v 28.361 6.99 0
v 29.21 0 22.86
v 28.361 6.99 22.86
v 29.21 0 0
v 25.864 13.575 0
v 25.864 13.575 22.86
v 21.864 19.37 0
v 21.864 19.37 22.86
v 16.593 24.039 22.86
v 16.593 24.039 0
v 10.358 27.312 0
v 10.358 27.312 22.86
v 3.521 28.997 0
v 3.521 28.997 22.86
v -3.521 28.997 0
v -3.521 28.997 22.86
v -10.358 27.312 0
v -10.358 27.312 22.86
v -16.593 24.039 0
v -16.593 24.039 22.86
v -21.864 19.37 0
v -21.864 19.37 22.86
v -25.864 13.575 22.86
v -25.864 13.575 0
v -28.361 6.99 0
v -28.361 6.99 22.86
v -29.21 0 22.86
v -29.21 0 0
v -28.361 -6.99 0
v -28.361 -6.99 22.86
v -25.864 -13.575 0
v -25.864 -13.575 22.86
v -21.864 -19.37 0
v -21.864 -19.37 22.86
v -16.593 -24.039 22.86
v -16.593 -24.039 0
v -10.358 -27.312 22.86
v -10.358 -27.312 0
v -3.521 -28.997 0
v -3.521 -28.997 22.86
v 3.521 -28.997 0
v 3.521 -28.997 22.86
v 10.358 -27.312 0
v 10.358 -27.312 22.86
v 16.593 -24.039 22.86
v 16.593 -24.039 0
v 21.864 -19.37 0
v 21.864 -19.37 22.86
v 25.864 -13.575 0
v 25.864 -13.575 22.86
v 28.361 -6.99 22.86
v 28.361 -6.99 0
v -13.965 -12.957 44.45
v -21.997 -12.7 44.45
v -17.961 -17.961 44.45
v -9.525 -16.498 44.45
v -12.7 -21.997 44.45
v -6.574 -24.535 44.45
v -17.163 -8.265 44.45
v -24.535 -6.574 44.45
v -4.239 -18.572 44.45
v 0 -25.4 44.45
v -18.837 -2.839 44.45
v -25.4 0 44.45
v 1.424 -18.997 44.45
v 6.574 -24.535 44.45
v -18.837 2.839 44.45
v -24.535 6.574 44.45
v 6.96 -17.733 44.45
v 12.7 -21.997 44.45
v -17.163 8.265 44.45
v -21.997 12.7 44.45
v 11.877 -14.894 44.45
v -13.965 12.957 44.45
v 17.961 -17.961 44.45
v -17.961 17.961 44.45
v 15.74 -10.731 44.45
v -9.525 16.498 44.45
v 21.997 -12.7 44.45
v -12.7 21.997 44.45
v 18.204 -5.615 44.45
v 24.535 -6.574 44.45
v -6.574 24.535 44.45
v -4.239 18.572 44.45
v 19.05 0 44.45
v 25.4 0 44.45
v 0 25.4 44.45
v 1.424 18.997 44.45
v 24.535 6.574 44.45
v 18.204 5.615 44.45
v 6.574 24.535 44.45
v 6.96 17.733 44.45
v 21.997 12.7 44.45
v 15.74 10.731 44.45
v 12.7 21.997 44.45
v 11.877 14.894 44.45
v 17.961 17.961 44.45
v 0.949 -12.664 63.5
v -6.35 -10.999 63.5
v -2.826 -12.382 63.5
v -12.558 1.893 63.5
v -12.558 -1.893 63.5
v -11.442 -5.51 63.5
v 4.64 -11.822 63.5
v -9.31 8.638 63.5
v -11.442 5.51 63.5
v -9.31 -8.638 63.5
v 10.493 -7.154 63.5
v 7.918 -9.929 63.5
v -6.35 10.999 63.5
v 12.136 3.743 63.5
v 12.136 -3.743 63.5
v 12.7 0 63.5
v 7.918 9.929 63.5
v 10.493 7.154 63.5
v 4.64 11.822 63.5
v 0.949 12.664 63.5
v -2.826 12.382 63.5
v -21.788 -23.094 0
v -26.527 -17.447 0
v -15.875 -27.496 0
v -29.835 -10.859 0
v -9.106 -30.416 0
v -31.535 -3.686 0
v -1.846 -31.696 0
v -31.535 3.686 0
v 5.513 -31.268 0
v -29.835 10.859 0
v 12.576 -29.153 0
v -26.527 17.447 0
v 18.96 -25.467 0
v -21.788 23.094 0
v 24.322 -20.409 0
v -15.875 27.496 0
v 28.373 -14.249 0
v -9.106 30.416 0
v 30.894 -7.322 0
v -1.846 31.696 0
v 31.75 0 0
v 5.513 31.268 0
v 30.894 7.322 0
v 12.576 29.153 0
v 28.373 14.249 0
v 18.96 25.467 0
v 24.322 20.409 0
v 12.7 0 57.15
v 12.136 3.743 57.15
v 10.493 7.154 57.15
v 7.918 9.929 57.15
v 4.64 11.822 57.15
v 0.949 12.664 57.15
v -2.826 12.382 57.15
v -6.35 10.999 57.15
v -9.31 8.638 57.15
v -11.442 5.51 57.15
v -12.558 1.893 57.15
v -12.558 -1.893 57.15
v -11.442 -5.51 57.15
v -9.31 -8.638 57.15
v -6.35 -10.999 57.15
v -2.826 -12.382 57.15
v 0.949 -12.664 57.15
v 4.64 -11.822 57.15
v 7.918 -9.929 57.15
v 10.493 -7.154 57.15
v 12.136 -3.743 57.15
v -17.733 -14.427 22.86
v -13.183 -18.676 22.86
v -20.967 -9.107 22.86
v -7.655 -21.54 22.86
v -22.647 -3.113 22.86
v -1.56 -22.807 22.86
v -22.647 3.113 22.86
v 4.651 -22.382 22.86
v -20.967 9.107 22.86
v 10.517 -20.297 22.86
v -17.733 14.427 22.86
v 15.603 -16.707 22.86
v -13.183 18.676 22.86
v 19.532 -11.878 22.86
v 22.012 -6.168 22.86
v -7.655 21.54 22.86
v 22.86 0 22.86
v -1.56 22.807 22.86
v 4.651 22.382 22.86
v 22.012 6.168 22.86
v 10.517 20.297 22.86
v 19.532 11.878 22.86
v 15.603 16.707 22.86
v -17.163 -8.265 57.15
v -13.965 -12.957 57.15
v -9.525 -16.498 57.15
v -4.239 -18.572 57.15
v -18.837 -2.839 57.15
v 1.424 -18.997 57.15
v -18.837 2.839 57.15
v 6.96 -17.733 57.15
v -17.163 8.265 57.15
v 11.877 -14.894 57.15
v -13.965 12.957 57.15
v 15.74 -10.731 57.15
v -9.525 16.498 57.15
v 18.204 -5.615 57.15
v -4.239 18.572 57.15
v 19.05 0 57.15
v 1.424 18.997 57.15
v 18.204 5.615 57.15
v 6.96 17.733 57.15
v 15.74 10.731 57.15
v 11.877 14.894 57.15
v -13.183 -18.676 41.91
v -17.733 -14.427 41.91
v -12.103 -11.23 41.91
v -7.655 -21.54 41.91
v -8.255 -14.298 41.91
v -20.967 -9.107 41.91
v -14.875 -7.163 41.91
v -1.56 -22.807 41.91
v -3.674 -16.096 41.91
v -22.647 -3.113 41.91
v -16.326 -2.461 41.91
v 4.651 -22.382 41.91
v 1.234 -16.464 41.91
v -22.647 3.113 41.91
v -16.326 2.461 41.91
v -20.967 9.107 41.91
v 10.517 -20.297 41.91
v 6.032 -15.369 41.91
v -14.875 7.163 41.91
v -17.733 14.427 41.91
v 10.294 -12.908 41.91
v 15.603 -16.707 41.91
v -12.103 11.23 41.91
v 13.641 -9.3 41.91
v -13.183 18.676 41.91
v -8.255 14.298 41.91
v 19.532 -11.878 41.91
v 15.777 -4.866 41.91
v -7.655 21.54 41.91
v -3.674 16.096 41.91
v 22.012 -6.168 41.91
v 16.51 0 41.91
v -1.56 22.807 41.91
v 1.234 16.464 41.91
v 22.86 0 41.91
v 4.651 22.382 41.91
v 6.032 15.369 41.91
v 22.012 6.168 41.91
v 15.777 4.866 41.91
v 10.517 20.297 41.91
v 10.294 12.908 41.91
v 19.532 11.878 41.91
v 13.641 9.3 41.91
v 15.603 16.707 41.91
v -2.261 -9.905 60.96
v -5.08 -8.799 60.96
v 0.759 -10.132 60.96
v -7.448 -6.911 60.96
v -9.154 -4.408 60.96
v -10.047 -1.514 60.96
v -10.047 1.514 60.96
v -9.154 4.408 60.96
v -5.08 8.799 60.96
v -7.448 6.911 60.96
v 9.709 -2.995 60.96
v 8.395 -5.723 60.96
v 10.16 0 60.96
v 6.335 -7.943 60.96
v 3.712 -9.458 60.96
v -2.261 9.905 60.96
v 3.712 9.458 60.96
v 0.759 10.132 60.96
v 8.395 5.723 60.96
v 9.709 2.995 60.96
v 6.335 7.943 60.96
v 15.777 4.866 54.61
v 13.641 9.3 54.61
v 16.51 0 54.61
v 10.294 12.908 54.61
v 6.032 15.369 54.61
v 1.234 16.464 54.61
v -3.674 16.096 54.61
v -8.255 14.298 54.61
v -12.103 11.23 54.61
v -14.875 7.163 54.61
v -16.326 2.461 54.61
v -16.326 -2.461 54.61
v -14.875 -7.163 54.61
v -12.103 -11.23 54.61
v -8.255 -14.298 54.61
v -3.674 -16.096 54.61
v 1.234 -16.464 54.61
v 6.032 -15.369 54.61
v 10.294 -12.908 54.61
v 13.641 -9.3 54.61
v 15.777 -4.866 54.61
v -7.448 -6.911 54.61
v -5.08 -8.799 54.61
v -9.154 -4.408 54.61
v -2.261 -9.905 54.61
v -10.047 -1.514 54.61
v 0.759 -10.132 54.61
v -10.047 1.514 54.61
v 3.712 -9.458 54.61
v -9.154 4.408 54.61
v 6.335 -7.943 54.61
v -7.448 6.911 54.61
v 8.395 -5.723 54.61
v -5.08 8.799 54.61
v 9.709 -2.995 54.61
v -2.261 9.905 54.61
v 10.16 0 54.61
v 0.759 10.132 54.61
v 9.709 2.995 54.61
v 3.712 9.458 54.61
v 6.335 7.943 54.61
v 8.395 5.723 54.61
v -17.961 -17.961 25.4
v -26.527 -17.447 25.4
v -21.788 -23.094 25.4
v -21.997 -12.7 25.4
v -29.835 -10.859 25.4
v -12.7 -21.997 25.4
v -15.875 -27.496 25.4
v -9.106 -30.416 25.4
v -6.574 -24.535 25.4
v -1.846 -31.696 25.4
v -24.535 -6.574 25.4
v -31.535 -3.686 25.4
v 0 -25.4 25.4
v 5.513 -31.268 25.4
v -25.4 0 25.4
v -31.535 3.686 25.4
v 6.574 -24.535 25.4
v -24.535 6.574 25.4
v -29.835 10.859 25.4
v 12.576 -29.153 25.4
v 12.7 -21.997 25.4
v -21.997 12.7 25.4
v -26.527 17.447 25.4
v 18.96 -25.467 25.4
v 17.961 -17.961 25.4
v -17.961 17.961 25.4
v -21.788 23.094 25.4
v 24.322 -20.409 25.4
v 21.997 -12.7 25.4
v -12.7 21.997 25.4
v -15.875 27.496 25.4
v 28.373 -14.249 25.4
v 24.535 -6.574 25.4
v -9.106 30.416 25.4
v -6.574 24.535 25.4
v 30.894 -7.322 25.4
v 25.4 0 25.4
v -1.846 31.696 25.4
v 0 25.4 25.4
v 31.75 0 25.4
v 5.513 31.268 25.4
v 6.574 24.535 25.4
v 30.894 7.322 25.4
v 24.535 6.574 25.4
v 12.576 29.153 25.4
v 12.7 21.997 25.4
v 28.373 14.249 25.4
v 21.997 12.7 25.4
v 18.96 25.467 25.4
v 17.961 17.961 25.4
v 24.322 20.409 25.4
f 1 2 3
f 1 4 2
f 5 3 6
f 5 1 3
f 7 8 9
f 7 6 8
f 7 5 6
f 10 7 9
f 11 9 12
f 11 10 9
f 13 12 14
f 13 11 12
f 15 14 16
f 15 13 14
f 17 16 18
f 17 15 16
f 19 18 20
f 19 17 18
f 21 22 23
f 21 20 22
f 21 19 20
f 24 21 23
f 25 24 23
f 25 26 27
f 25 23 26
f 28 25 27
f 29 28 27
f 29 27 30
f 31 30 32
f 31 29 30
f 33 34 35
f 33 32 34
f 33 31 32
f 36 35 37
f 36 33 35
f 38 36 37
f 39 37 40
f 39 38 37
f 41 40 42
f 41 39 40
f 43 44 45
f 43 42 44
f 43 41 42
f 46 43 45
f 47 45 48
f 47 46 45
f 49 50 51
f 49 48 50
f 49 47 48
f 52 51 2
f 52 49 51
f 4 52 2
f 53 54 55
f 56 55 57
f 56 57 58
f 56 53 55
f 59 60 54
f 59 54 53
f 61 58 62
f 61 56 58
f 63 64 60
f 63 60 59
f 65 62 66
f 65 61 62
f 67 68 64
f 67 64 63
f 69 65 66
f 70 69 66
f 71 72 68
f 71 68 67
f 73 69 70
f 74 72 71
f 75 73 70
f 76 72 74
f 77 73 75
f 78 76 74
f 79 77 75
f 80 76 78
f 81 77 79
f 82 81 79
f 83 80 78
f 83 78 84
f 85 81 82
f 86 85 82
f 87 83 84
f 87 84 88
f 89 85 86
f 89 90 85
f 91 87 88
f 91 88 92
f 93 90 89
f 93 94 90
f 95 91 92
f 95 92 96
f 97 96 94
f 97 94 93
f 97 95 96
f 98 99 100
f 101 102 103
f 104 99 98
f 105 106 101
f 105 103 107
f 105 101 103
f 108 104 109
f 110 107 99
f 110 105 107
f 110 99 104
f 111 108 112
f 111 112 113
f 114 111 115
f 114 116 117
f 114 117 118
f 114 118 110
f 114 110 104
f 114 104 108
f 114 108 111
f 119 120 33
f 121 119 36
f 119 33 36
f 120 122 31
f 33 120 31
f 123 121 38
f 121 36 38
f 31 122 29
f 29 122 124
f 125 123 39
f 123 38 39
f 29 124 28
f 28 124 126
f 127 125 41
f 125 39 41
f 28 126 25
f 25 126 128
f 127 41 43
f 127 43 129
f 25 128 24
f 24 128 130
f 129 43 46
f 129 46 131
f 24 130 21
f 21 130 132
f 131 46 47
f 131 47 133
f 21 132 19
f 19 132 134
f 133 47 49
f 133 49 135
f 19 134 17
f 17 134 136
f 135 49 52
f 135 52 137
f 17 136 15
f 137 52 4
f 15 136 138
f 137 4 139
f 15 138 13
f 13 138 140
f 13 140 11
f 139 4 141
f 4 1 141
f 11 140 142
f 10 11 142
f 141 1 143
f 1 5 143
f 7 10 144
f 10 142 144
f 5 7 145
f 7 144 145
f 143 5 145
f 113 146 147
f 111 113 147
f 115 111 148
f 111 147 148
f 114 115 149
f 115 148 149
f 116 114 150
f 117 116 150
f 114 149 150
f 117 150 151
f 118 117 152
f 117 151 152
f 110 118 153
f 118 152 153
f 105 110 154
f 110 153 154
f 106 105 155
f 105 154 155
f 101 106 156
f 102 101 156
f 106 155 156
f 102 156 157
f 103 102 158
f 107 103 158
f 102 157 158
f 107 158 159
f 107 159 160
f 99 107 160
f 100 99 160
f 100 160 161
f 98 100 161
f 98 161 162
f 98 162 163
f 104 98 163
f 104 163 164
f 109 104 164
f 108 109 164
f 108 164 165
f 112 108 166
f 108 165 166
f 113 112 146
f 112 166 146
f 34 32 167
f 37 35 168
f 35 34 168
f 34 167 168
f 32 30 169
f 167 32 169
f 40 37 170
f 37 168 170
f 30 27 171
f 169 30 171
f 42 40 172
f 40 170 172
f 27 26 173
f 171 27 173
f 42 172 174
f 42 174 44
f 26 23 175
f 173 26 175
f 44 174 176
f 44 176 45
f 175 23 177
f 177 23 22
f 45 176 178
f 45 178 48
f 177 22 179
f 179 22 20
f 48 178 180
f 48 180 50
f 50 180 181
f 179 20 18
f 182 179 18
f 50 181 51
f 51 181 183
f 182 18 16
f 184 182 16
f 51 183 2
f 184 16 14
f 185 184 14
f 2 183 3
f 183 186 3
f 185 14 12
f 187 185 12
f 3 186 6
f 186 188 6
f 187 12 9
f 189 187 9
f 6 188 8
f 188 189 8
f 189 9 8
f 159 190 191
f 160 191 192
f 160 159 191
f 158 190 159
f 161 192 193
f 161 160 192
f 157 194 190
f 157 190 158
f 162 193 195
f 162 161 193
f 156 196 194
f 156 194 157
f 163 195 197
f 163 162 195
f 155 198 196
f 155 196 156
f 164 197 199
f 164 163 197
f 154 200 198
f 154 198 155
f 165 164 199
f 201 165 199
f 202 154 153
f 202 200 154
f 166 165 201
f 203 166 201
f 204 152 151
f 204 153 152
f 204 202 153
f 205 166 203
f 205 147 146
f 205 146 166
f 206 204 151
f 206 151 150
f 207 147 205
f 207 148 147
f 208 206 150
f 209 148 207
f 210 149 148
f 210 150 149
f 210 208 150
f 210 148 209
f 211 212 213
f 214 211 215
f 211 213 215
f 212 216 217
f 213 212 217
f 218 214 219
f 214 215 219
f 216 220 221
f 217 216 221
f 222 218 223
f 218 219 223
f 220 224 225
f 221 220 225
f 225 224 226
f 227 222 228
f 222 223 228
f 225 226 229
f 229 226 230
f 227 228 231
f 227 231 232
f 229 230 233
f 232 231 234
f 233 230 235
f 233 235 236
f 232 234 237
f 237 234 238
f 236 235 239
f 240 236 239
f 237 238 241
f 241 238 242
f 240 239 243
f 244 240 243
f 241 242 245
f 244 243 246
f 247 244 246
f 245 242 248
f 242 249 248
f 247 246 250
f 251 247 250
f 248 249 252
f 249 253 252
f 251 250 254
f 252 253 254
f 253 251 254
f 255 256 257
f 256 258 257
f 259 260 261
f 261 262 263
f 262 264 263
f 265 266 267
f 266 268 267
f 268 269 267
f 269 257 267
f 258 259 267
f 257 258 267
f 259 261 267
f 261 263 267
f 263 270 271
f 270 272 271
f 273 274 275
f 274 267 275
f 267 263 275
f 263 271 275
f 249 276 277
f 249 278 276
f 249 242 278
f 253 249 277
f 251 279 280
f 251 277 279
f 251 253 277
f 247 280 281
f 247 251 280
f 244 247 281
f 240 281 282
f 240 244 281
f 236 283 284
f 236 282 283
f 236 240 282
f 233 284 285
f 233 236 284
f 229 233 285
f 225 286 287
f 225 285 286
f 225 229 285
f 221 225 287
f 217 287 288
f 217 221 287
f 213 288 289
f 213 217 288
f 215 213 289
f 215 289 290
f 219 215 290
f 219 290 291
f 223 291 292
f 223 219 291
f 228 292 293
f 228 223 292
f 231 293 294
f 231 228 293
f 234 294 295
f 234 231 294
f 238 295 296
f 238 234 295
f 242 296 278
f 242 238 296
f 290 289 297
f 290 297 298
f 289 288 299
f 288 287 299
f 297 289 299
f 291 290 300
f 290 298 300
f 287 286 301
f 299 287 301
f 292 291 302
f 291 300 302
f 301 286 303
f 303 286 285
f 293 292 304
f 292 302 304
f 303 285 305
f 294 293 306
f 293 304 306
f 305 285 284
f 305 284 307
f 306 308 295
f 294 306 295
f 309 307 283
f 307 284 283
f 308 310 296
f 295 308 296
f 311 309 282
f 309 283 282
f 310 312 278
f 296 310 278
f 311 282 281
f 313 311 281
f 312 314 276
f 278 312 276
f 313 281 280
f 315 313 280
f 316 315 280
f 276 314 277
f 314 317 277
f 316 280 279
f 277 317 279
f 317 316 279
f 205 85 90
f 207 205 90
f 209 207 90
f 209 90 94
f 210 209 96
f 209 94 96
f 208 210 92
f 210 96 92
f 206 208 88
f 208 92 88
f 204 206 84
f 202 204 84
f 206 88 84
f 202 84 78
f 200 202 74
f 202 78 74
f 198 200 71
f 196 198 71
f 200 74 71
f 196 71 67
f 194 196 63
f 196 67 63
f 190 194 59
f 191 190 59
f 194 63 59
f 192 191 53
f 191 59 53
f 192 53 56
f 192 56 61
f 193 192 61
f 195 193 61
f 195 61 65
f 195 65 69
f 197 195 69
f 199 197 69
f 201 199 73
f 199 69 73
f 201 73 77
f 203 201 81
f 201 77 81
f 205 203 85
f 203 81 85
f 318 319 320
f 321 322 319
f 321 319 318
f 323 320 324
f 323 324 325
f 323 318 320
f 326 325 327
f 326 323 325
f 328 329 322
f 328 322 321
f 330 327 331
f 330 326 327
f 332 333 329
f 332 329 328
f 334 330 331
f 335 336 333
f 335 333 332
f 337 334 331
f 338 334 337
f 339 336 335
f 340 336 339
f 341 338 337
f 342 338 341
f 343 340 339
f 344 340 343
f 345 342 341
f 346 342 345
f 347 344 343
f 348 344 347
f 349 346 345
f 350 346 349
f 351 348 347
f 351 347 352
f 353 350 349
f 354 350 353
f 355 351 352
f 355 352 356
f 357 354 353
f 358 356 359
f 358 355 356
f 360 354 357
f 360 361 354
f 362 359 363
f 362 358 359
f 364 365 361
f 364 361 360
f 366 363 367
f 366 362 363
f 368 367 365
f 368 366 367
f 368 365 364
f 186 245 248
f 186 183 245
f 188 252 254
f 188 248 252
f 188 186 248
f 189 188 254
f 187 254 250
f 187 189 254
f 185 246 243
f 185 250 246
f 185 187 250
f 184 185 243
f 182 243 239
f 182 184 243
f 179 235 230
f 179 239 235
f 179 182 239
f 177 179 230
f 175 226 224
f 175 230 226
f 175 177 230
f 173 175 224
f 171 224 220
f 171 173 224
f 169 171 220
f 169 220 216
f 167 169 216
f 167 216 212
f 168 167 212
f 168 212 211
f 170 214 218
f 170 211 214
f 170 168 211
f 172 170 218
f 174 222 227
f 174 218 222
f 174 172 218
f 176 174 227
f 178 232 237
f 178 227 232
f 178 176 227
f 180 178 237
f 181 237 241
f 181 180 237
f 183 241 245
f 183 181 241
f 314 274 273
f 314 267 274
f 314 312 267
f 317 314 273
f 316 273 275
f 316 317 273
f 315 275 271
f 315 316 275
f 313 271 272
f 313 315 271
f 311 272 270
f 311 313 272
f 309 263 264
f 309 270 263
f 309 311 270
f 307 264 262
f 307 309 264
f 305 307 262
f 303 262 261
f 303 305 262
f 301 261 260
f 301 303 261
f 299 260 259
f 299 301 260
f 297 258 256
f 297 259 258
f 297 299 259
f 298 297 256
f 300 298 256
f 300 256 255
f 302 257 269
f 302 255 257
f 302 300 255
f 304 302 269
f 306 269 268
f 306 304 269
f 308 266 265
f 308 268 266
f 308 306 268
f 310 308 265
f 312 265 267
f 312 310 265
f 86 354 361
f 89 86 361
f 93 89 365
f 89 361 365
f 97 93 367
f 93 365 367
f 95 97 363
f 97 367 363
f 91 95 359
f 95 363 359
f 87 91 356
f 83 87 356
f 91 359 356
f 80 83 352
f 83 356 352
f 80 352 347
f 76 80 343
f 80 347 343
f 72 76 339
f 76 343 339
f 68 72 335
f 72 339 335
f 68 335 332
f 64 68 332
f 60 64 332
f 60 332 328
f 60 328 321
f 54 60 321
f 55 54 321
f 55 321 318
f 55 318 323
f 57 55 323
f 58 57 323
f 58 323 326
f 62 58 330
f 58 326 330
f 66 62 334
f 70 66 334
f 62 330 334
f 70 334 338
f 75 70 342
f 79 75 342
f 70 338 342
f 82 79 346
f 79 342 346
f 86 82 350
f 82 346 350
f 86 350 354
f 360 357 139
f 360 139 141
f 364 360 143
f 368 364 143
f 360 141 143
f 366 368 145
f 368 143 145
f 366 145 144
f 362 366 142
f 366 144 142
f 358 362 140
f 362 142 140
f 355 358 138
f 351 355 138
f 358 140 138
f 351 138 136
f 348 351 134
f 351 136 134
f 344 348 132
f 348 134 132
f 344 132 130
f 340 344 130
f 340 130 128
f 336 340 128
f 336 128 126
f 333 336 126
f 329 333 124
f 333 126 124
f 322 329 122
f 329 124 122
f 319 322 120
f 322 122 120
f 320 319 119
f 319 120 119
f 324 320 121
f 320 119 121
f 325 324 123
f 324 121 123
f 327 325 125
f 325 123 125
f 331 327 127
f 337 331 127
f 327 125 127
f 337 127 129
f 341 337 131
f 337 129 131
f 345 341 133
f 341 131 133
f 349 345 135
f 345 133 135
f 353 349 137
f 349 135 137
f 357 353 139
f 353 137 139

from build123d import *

# Parameters (mm, degrees)
F0_R     = 31.75
F1_DEPTH = 25.4
F2_R     = 25.4
F3_DEPTH = 19.05
F4_R     = 19.05
F5_DEPTH = 12.7
F6_R     = 12.7
F7_DEPTH = 6.35
F8_T     = -2.54


with BuildPart() as f1:
    # F0 (on Top) → F1 (new body)
    with BuildSketch(Plane.XY):
        Circle(F0_R)
    extrude(amount=F1_DEPTH)

    # F2 (on face) → F3 (join)
    with BuildSketch(Plane.XY.offset(25.4)):
        Circle(F2_R)
    extrude(amount=F3_DEPTH)

    # F4 (on face) → F5 (join)
    with BuildSketch(Plane.XY.offset(44.45)):
        Circle(F4_R)
    extrude(amount=F5_DEPTH)

    # F6 (on face) → F7 (join)
    with BuildSketch(Plane.XY.offset(57.15)):
        Circle(F6_R)
    extrude(amount=F7_DEPTH)

    # F8
    f8_openings = [f1.faces().sort_by_distance(p)[0] for p in [
        (0, 0, 0),
    ]]
    offset(amount=F8_T, openings=f8_openings, kind=Kind.INTERSECTION)


solid = f1.part
